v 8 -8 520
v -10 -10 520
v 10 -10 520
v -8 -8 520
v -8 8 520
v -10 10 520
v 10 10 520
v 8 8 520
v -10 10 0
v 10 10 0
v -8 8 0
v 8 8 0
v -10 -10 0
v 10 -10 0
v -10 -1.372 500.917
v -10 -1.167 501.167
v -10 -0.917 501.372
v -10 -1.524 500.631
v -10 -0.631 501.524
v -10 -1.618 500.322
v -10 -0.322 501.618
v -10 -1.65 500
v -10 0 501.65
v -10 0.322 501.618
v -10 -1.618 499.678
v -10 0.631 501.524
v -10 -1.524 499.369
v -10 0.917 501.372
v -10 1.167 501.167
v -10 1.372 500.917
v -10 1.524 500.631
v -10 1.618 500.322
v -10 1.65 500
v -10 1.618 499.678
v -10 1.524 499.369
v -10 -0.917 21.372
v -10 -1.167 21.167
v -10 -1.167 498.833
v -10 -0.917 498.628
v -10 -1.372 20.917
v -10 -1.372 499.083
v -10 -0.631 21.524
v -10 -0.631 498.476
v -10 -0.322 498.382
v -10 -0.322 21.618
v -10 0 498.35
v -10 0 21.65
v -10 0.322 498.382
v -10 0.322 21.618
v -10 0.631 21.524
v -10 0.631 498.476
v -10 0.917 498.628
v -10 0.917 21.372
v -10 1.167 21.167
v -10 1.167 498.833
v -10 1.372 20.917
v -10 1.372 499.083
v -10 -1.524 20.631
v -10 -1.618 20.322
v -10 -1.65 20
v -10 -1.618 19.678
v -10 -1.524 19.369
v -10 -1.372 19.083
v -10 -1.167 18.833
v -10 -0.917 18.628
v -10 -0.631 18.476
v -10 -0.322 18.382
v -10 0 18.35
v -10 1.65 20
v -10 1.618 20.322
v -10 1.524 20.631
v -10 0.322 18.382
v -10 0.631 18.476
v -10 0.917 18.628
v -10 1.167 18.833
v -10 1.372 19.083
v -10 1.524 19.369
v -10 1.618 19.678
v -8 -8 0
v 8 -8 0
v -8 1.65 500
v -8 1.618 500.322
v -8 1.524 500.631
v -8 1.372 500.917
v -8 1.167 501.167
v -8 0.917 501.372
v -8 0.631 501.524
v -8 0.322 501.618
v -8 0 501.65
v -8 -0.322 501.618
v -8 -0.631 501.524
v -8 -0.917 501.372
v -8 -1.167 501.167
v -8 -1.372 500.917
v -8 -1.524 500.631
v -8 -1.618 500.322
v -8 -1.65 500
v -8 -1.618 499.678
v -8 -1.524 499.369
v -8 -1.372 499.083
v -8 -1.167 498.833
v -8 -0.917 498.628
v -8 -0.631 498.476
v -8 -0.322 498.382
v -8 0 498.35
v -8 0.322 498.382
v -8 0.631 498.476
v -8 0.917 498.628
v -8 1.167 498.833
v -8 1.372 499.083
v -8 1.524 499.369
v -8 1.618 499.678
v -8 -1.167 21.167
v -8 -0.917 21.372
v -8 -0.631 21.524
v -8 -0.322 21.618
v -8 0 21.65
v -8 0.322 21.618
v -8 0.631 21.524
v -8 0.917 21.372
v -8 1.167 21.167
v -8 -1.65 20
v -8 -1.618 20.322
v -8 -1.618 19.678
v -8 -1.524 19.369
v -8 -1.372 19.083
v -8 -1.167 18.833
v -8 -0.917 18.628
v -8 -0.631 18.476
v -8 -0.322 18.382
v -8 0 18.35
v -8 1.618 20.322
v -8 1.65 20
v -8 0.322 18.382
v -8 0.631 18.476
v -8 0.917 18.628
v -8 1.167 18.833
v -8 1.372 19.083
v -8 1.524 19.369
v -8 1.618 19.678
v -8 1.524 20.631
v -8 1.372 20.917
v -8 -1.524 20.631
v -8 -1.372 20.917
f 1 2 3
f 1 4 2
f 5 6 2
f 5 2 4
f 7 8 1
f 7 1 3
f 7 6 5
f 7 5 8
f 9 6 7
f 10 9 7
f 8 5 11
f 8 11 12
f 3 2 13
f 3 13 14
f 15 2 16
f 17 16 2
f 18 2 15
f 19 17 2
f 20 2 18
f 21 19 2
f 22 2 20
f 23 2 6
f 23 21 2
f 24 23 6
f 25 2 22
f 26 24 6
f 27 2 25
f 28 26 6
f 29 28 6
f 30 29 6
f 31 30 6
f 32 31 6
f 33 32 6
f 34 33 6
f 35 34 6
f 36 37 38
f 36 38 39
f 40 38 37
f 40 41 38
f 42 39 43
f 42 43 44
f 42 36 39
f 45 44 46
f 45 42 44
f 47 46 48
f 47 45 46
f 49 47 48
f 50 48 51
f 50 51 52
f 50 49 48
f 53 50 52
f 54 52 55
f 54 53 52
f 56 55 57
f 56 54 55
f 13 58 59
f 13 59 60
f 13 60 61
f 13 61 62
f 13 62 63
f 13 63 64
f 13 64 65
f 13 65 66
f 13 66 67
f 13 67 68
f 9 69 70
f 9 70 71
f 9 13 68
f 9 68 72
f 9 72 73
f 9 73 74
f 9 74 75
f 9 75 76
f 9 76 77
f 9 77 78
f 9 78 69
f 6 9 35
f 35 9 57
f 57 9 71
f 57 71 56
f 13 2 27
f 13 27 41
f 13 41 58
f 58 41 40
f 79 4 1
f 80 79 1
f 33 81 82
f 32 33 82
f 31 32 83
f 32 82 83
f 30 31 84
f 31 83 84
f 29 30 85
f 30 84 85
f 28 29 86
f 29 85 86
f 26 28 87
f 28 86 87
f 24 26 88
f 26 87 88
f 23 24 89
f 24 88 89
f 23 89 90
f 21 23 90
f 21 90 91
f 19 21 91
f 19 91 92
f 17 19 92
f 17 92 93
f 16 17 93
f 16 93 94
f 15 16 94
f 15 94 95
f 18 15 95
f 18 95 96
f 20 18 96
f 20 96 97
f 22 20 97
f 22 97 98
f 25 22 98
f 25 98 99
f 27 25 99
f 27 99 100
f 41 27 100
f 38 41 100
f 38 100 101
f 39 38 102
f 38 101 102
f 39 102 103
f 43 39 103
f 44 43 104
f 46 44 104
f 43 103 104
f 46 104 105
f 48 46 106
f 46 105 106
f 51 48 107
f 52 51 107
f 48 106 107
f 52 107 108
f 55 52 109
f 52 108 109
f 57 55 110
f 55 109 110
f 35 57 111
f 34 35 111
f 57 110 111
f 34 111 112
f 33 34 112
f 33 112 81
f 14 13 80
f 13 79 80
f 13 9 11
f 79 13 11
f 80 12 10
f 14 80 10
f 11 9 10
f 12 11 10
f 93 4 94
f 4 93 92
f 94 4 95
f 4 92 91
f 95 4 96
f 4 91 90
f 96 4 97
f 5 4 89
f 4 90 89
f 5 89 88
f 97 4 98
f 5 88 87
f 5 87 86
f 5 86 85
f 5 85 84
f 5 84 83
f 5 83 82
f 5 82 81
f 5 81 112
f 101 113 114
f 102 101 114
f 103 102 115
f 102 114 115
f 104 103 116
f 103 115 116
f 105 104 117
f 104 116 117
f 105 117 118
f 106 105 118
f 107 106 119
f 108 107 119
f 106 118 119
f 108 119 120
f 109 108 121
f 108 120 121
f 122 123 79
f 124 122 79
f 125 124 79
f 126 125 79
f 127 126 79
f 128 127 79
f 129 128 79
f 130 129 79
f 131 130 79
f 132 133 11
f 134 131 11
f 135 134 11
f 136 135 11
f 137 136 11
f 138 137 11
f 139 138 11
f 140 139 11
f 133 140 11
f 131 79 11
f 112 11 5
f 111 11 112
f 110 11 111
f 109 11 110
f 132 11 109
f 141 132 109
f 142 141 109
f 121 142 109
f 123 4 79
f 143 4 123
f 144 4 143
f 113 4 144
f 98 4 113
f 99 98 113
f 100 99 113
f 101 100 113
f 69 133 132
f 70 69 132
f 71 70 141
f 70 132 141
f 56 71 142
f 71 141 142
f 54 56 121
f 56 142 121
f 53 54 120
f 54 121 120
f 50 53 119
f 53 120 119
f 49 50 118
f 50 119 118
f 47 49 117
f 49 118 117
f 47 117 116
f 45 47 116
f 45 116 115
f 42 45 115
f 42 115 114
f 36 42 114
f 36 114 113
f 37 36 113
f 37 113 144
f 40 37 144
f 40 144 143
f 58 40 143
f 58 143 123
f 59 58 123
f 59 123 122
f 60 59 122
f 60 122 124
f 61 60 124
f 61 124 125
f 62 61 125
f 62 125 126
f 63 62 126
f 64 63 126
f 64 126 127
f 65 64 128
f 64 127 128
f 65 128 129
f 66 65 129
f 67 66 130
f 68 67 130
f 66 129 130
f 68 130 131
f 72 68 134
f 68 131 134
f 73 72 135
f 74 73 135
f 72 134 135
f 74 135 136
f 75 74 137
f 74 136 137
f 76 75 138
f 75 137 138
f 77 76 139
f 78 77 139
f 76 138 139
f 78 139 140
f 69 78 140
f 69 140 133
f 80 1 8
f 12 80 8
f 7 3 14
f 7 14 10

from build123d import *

# Parameters (mm, degrees)
SKETCH_3_W               = 20
SKETCH_3_H               = 20
EXTRUDE_1_DEPTH          = 500
SKETCH_6_W               = 16
SKETCH_6_H               = 16
CUT_EXTRUDE_3_DEPTH      = 560
SKETCH_8_W               = 20
SKETCH_8_H               = 20
SKETCH_8_W_2             = 16
SKETCH_8_H_2             = 16
EXTRUDE_3_DEPTH          = 20
SKETCH_12_R              = 1
CUT_EXTRUDE_7_DEPTH      = 10
M4X0_7_1_D               = 3.3
M4X0_7_1_DEPTH           = 11.5
M4X0_7_1_TIP             = 0.991420021
M4X0_7_1_ON_FACE_2_D     = 3.3
M4X0_7_1_ON_FACE_2_DEPTH = 11.5
M4X0_7_1_ON_FACE_2_TIP   = 0.991420021


with BuildPart() as part:
    # ｽｹｯﾁ3 → ﾎﾞｽ - 押し出し1 (new body)
    with BuildSketch(Plane.XY):
        Rectangle(SKETCH_3_W, SKETCH_3_H)
    extrude(amount=EXTRUDE_1_DEPTH)

    # ｽｹｯﾁ6 → ｶｯﾄ - 押し出し3 (cut)
    with BuildSketch(Plane.XY.offset(500)):
        Rectangle(SKETCH_6_W, SKETCH_6_H)
    extrude(amount=-CUT_EXTRUDE_3_DEPTH, mode=Mode.SUBTRACT)

    # ｽｹｯﾁ8 → ﾎﾞｽ - 押し出し3 (add)
    with BuildSketch(Plane.XY.offset(500)):
        Rectangle(SKETCH_8_W, SKETCH_8_H)
        Rectangle(SKETCH_8_W_2, SKETCH_8_H_2, mode=Mode.SUBTRACT)
    extrude(amount=EXTRUDE_3_DEPTH)

    # ｽｹｯﾁ12 → ｶｯﾄ - 押し出し7 (cut)
    with BuildSketch(Plane.ZY.offset(10)):
        with Locations((20, 0)):
            Circle(SKETCH_12_R)
        with Locations((500, 0)):
            Circle(SKETCH_12_R)
    extrude(amount=-CUT_EXTRUDE_7_DEPTH, mode=Mode.SUBTRACT)

    # M4x0.7 ねじ穴1
    with Locations(Plane(origin=(-10, 0, 20), x_dir=(0, -1, 0), z_dir=(-1, 0, 0))):
        with Locations((0, 0)):
            Hole(M4X0_7_1_D / 2, depth=M4X0_7_1_DEPTH)
            with Locations((0, 0, -(M4X0_7_1_DEPTH + M4X0_7_1_TIP / 2))):  # 118° drill point
                Cone(0, M4X0_7_1_D / 2, M4X0_7_1_TIP, mode=Mode.SUBTRACT)

    # M4x0.7 ねじ穴1 on face 2
    with Locations(Plane(origin=(-8, 0, 500), x_dir=(0, -1, 0), z_dir=(-1, 0, 0))):
        with Locations((0, 0)):
            Hole(M4X0_7_1_ON_FACE_2_D / 2, depth=M4X0_7_1_ON_FACE_2_DEPTH)
            with Locations((0, 0, -(M4X0_7_1_ON_FACE_2_DEPTH + M4X0_7_1_ON_FACE_2_TIP / 2))):  # 118° drill point
                Cone(0, M4X0_7_1_ON_FACE_2_D / 2, M4X0_7_1_ON_FACE_2_TIP, mode=Mode.SUBTRACT)


solid = part.part
